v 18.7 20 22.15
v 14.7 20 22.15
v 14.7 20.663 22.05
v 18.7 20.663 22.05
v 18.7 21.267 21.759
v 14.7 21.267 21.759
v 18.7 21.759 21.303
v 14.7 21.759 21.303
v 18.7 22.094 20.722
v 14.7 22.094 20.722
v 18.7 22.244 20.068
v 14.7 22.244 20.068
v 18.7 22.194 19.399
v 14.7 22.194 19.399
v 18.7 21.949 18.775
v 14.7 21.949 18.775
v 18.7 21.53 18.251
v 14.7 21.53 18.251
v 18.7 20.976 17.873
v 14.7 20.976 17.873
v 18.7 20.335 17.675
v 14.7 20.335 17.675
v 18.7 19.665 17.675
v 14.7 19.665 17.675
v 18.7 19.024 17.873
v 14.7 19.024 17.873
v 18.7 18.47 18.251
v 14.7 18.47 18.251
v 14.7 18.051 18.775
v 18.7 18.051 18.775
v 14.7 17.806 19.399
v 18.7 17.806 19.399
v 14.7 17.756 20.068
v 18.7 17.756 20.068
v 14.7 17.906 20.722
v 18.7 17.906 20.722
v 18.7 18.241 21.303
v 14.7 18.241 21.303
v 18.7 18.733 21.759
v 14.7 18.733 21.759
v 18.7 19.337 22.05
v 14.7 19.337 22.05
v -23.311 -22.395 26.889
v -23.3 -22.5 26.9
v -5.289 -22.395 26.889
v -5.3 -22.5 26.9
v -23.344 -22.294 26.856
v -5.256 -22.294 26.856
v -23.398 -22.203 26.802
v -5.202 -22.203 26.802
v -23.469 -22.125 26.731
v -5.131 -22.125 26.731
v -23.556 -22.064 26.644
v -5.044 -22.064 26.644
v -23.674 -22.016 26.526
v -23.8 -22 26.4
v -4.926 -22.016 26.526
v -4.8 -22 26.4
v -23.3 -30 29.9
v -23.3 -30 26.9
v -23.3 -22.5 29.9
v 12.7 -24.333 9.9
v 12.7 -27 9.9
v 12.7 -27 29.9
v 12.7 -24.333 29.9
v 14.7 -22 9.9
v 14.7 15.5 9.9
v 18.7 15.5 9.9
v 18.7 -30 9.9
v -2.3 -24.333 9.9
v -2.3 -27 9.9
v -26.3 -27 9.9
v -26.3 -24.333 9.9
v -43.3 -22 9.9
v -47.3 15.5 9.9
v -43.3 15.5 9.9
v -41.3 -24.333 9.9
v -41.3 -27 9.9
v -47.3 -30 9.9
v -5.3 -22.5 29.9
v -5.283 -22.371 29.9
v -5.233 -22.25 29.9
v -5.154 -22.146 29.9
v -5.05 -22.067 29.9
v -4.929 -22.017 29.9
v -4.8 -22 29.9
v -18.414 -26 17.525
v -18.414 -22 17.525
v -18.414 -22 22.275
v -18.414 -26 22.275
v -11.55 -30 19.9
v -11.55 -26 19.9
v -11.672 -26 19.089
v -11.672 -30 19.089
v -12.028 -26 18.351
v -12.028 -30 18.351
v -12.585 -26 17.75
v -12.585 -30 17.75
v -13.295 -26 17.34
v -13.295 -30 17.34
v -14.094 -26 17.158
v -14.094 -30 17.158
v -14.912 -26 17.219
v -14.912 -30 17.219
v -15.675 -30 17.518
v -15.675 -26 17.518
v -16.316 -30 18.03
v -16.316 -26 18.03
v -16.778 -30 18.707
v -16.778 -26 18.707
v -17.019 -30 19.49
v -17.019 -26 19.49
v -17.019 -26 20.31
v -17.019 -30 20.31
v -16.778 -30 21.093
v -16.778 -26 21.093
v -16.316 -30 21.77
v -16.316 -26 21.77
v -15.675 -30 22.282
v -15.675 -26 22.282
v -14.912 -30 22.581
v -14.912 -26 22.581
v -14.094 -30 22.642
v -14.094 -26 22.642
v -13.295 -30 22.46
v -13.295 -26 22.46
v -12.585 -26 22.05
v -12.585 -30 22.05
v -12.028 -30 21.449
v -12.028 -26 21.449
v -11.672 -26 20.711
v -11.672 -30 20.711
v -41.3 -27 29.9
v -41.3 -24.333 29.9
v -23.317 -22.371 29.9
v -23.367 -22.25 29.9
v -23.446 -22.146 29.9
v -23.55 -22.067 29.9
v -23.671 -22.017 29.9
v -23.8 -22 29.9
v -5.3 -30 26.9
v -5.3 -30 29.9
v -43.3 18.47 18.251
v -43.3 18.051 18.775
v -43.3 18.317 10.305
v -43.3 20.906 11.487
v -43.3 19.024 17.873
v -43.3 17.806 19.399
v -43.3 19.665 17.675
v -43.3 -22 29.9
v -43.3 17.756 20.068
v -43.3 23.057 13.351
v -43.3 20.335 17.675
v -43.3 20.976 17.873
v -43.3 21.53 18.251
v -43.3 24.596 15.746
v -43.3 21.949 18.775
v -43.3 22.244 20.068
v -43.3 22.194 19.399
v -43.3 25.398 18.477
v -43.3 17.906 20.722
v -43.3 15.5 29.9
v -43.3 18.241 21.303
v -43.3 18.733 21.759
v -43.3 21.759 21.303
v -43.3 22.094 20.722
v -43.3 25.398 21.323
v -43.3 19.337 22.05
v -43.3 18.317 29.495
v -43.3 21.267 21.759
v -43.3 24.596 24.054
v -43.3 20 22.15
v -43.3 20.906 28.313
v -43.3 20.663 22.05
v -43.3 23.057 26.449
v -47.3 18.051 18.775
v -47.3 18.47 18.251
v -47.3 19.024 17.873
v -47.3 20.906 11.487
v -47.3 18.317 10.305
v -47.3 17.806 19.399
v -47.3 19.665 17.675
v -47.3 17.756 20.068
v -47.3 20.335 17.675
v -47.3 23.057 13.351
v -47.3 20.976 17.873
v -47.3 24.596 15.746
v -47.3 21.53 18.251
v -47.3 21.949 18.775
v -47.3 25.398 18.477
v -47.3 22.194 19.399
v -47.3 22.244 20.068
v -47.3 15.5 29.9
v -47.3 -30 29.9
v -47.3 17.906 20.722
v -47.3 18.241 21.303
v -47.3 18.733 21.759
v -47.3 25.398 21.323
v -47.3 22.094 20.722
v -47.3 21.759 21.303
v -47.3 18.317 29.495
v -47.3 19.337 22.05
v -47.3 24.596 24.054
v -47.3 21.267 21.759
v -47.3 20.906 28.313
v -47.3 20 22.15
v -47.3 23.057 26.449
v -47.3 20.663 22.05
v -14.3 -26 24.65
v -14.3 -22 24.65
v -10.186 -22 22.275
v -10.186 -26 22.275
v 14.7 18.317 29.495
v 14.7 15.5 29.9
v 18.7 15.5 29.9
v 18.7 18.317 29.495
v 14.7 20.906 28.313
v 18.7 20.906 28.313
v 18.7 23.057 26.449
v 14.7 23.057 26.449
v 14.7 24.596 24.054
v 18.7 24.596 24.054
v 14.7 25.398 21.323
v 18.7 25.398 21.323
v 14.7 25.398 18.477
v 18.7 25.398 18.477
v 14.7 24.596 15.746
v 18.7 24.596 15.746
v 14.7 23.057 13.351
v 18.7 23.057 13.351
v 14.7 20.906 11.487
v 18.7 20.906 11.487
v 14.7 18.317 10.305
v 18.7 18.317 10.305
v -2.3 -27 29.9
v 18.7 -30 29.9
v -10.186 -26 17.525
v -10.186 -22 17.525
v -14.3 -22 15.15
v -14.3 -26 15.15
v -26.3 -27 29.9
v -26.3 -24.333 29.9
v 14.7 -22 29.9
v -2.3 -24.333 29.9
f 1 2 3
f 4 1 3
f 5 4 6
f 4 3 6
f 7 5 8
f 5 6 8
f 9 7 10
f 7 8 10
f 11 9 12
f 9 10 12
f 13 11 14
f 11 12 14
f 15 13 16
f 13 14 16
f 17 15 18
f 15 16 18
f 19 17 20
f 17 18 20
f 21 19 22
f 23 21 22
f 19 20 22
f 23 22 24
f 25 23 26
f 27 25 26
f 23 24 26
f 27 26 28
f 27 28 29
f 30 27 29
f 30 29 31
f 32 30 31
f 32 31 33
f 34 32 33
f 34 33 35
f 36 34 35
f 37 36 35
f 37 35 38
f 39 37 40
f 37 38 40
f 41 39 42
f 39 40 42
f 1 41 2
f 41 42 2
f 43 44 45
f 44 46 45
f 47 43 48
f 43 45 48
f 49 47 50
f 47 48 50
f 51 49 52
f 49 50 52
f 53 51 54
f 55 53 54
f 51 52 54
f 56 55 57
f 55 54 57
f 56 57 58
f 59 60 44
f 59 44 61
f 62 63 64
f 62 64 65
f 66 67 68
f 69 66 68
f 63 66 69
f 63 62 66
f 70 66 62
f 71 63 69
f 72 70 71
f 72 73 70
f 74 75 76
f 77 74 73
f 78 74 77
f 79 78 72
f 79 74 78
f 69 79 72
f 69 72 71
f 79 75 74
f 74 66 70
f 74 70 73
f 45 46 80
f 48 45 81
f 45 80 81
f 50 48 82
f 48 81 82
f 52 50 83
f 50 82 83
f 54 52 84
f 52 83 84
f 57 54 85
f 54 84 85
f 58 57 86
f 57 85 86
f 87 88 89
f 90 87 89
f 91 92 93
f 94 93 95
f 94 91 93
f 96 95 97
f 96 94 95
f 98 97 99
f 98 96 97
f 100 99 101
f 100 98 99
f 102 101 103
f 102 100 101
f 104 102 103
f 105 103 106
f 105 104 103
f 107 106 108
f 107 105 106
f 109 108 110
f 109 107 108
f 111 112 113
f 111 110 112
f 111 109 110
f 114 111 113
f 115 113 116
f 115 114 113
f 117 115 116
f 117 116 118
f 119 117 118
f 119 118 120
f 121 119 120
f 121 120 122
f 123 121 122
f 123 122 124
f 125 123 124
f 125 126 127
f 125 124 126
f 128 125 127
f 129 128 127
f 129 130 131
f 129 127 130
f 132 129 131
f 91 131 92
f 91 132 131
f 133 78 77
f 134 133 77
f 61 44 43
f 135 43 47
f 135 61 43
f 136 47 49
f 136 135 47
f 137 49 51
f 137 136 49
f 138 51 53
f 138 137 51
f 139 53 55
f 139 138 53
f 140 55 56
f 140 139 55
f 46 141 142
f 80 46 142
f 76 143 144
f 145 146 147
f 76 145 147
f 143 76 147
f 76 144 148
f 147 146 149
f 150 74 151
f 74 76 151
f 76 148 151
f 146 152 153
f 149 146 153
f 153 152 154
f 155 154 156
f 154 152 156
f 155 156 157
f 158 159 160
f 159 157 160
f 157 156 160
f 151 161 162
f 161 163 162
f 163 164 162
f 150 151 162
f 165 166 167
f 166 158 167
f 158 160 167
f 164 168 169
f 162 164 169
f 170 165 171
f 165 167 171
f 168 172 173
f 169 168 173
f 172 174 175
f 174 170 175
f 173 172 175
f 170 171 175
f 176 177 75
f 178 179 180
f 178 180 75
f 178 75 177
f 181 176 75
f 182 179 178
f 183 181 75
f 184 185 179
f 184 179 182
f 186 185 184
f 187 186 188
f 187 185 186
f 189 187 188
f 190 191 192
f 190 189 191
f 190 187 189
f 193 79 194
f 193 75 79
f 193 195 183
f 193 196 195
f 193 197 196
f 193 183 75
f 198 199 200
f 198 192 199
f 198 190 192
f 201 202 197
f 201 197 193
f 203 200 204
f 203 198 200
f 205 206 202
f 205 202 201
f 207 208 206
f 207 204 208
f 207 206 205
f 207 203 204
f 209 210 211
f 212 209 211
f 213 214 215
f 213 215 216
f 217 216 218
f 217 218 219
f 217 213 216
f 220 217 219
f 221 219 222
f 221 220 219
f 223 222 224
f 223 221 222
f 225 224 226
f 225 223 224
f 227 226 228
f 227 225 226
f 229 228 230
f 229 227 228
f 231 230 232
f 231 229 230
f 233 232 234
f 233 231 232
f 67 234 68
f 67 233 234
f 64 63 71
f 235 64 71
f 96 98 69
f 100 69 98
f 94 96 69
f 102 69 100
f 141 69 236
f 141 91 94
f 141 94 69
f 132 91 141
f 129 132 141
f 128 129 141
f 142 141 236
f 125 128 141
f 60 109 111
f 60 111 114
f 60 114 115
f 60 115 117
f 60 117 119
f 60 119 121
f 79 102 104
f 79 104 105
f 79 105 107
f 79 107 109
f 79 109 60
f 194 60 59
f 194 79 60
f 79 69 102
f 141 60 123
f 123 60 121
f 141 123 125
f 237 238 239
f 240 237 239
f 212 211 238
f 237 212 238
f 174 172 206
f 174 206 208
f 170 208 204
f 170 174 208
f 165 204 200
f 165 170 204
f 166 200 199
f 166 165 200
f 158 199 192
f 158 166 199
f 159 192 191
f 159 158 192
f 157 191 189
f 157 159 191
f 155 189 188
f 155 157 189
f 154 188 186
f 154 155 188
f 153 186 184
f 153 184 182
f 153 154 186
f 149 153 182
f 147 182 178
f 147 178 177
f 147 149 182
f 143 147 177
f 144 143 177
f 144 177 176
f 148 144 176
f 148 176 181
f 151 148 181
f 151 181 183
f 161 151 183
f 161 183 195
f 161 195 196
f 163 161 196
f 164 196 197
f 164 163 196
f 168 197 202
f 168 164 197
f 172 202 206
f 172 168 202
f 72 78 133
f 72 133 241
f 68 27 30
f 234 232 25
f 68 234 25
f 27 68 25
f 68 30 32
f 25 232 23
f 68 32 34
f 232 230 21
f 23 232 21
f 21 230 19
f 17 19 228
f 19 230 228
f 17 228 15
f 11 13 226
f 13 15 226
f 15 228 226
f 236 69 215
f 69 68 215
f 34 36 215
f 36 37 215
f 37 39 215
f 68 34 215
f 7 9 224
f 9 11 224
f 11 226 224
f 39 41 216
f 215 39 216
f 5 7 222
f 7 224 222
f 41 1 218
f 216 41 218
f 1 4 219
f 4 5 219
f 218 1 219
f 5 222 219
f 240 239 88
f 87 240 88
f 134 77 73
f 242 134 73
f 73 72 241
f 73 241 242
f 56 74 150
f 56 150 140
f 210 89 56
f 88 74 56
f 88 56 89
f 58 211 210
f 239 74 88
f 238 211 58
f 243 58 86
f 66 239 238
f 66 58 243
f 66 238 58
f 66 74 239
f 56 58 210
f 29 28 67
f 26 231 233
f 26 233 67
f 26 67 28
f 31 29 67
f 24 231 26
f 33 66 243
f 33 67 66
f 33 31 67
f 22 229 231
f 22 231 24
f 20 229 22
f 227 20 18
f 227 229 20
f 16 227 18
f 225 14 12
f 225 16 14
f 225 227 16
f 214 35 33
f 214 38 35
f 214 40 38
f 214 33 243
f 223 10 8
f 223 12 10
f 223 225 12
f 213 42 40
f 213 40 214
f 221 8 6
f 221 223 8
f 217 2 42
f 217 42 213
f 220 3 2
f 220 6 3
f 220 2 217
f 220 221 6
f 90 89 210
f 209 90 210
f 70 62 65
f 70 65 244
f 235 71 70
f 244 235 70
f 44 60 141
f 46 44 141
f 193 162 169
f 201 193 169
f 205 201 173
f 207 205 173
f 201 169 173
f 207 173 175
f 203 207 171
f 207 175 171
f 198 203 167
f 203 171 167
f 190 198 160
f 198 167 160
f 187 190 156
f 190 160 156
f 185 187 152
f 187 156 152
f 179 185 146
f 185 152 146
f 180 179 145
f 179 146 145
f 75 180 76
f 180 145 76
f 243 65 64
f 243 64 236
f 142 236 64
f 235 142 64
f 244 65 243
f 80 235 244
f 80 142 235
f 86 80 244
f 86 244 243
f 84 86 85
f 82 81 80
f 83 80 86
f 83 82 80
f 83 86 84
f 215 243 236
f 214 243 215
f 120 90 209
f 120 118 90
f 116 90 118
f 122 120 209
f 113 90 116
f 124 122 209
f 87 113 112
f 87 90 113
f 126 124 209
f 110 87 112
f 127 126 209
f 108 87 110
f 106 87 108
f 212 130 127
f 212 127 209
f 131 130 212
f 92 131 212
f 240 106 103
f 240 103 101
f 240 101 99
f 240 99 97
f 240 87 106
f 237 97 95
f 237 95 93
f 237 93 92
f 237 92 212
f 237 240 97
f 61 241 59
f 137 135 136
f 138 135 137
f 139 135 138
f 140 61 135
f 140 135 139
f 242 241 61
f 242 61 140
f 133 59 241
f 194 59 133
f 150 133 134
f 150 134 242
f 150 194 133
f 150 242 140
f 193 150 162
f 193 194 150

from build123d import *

# Parameters (mm, degrees)
SKETCH005_W             = 58
SKETCH005_H             = 20
SKETCH005_R             = 2.75
PAD004_DEPTH            = 8
SKETCH006_R             = 2.25
PAD005_DEPTH            = 4
POCKET005_DEPTH         = 4
SKETCH011_W             = 15
SKETCH011_H             = 2.666667
POCKET007_DEPTH         = 20
SKETCH012_W             = 18
SKETCH012_H             = 3
POCKET008_DEPTH         = 8
FILLET_R                = 0.5
BODY002_PLACEMENT_ANGLE = 180


with BuildPart() as part:
    # Sketch005 → Pad004 (new body)
    with BuildSketch(Plane.XZ):
        Rectangle(SKETCH005_W, SKETCH005_H)
        Circle(SKETCH005_R, mode=Mode.SUBTRACT)
    extrude(amount=PAD004_DEPTH)

    # Sketch006 (on Face4 of Pad004) → Pad005 (join)
    with BuildSketch(Plane(origin=(-29, 0, 0), x_dir=(0, 0, -1), z_dir=(-1, 0, 0))):
        with BuildLine():
            Line((-10, 0), (10, 0))
            Line((10, 0), (10, 45.5))
            ThreePointArc((10, 45.5), (0, 55.5), (-10, 45.5))
            Line((-10, 45.5), (-10, 0))
        make_face()
        with Locations((0, 50)):
            Circle(SKETCH006_R, mode=Mode.SUBTRACT)
    pad005 = extrude(amount=PAD005_DEPTH)

    # Mirrored003: Pad005 across YZ
    add(pad005.mirror(Plane.YZ))

    # Sketch007 (on Face5 of Mirrored003) → Pocket005 (cut)
    with BuildSketch(Plane.XZ.offset(8)):
        Polygon((4.113621, 2.375), (0, 4.75), (-4.113621, 2.375), (-4.113621, -2.375), (0, -4.75), (4.113621, -2.375), align=None)
    extrude(amount=-POCKET005_DEPTH, mode=Mode.SUBTRACT)

    # Sketch011 (on Face14 of Pocket005) → Pocket007 (cut)
    with BuildSketch(Plane(origin=(0, 0, 10), x_dir=(-1, 0, 0), z_dir=(0, 0, 1))):
        with Locations((-19.5, 4.333334)):
            Rectangle(SKETCH011_W, SKETCH011_H)
    pocket007 = extrude(amount=-POCKET007_DEPTH, mode=Mode.SUBTRACT)

    # Mirrored004: Pocket007 across YZ
    add(pocket007.mirror(Plane.YZ), mode=Mode.SUBTRACT)

    # Sketch012 (on Face3 of Mirrored004) → Pocket008 (cut)
    with BuildSketch(Plane(origin=(0, 0, 0), x_dir=(1, 0, 0), z_dir=(0, 1, 0))):
        with Locations((0, 8.5)):
            Rectangle(SKETCH012_W, SKETCH012_H)
    extrude(amount=-POCKET008_DEPTH, mode=Mode.SUBTRACT)

    # Fillet
    fillet_edges = [part.edges().sort_by_distance(p)[0] for p in [
        (0, -8, -7),
        (9, -8, -8.5),
        (-9, -8, -8.5),
    ]]
    fillet(fillet_edges, radius=FILLET_R)


with BuildPart() as part_1:
    # Body002 placement: moved
    add(part.part.moved(Location((-14.3, -30, 19.9))).rotate(Axis((-14.3, -30, 19.9), (1, 0, 0)), BODY002_PLACEMENT_ANGLE))


solid = part_1.part
